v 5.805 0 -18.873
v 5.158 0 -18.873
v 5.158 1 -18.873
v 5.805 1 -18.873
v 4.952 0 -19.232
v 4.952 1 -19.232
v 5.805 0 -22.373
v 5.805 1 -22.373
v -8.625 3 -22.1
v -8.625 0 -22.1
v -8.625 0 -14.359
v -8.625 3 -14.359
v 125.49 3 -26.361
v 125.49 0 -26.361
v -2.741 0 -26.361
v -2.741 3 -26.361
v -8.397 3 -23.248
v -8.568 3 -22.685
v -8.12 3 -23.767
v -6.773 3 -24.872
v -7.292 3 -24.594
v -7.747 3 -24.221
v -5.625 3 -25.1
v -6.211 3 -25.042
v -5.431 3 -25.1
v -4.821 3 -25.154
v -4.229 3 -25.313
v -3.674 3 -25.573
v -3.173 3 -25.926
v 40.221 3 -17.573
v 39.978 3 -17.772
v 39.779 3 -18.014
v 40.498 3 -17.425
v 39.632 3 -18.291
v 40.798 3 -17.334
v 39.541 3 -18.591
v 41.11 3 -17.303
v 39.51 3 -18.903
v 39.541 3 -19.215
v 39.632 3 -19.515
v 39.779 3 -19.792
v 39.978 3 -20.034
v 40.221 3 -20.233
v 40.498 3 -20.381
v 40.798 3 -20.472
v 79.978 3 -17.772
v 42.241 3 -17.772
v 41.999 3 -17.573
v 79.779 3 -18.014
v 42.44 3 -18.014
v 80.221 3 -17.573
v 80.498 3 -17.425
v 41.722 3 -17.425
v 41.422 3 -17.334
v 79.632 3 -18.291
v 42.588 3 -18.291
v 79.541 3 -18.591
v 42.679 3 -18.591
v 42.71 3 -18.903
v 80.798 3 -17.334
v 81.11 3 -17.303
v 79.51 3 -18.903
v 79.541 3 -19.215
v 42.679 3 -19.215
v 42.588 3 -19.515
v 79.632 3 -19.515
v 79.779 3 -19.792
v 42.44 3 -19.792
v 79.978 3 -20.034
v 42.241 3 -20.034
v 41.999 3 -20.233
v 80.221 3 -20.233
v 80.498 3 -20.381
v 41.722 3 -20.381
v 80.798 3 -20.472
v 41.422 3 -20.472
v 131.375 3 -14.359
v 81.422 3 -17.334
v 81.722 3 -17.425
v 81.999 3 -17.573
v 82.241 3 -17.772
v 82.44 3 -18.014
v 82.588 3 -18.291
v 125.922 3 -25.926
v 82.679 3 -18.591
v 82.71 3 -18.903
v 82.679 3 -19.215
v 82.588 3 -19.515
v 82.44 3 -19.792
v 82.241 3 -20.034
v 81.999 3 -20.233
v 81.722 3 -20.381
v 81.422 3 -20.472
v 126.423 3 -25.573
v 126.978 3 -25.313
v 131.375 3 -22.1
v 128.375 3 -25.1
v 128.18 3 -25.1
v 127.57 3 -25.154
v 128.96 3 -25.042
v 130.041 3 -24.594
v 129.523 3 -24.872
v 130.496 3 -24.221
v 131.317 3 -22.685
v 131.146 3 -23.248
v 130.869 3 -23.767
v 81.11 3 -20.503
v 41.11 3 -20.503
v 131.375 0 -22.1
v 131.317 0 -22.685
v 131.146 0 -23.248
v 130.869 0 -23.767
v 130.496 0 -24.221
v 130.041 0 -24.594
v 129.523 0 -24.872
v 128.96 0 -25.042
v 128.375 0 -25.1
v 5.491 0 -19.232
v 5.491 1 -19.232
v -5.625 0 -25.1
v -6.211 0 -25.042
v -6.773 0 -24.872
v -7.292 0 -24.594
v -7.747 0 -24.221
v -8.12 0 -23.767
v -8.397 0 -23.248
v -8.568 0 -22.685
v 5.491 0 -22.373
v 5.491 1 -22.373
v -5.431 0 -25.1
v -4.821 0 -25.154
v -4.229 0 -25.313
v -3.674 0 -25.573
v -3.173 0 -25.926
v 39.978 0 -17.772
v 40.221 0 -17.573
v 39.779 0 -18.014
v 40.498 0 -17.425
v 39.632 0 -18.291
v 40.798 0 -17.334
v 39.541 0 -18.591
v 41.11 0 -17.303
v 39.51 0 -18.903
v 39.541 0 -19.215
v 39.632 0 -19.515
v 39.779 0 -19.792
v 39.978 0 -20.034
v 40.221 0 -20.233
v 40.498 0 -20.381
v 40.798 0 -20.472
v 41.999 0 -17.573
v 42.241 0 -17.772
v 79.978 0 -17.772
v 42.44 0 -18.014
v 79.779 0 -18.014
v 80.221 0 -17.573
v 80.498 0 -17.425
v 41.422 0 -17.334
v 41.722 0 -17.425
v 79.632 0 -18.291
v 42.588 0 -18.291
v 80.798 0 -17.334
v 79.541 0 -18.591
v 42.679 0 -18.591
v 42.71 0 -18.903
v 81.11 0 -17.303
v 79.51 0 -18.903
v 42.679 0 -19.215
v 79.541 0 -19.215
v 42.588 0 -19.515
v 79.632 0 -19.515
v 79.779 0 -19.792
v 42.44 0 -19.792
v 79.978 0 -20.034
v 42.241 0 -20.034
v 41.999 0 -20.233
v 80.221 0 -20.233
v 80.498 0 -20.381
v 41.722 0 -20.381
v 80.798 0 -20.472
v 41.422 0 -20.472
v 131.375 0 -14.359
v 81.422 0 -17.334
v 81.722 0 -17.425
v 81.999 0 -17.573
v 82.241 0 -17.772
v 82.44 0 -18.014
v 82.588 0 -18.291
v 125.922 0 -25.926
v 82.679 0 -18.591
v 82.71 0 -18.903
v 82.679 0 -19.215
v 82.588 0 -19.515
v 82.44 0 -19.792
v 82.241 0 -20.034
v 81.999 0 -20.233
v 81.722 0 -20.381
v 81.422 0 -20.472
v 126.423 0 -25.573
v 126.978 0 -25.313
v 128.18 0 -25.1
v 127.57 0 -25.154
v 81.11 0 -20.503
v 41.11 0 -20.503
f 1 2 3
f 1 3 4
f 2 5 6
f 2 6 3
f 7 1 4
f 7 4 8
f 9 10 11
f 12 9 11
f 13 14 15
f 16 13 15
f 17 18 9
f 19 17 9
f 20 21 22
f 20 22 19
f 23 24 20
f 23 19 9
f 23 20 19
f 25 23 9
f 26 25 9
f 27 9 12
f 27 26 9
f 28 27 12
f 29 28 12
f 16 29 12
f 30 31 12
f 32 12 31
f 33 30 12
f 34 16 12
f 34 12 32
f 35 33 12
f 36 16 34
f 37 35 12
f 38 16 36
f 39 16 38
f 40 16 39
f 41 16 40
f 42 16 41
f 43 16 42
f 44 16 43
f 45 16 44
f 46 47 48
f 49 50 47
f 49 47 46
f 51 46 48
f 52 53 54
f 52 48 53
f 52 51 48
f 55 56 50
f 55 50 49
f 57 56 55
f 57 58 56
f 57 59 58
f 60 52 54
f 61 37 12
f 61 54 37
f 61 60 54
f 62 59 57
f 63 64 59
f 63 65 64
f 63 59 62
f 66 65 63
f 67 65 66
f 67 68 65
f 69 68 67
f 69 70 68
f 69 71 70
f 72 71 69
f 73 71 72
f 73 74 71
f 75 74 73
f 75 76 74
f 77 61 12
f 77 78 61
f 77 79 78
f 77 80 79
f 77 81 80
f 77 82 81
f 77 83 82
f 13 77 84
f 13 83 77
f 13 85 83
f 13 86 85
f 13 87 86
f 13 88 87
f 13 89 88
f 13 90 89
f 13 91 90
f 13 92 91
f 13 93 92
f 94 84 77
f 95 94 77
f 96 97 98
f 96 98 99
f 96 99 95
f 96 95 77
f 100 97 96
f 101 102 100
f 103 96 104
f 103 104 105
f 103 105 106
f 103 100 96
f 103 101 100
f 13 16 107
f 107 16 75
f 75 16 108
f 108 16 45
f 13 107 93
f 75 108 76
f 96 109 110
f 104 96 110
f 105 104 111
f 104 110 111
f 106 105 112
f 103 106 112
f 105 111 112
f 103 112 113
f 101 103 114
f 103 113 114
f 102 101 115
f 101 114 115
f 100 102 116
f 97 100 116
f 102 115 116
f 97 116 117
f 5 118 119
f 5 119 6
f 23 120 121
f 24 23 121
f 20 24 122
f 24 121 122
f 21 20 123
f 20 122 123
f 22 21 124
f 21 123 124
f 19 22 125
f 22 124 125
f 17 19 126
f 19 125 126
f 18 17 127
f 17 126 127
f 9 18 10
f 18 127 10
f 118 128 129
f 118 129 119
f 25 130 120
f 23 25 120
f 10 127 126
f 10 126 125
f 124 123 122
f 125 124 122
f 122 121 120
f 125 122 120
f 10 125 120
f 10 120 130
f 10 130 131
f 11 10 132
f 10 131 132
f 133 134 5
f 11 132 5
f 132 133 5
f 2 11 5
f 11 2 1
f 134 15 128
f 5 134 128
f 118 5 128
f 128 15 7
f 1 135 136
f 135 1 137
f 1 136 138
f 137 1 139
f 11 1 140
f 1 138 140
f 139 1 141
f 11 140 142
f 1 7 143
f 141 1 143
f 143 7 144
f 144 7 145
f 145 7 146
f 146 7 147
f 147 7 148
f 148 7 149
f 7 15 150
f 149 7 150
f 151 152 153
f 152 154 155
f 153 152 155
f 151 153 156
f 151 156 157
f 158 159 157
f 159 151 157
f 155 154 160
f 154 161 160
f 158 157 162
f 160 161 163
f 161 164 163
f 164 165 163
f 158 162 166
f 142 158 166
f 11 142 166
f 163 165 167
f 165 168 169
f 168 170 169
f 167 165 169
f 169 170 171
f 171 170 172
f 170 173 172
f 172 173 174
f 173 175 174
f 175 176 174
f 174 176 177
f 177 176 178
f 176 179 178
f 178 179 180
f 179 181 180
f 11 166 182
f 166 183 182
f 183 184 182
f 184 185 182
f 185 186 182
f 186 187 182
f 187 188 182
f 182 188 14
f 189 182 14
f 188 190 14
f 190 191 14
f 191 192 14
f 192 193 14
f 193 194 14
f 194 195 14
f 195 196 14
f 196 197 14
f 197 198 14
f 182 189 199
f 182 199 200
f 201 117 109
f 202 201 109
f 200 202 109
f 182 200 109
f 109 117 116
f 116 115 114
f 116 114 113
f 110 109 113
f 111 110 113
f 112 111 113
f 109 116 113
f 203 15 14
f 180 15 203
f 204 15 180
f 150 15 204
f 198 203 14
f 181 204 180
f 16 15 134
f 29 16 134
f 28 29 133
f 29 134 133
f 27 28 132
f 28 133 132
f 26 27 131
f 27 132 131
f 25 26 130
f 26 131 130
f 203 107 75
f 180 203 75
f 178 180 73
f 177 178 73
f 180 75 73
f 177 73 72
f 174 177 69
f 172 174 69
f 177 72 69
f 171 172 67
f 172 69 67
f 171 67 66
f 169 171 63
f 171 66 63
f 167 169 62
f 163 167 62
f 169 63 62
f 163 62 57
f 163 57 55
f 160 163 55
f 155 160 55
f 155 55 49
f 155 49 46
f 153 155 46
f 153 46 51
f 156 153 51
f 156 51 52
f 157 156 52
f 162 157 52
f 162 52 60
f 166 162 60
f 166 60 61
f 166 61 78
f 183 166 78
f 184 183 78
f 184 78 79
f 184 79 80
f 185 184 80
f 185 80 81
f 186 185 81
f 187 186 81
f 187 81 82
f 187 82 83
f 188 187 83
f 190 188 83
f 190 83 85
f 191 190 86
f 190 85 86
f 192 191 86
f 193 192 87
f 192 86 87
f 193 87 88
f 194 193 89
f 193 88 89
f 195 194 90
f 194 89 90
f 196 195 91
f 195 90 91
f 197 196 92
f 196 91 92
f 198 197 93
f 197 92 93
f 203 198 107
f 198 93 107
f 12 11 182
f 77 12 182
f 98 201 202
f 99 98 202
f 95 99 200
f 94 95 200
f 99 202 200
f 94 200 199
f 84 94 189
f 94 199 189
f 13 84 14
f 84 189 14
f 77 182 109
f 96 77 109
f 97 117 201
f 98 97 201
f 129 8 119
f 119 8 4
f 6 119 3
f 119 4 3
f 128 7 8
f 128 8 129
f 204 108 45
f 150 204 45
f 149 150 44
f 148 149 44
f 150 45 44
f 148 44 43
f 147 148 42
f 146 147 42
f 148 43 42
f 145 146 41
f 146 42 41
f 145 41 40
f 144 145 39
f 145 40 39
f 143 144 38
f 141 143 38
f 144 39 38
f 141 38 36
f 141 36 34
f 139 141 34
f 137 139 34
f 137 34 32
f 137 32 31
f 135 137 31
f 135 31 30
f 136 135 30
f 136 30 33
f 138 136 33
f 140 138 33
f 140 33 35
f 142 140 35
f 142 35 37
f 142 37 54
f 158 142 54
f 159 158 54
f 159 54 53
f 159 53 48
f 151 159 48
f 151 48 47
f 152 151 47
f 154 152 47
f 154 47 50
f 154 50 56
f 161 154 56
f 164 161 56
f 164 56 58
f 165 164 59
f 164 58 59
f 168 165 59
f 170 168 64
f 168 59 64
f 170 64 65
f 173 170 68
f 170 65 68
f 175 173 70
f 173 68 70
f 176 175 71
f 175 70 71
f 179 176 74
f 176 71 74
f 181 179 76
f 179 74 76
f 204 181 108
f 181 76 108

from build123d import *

# Parameters (mm, degrees)
BOSS_EXTRUDE1_DEPTH = 3
CUT_EXTRUDE1_DEPTH  = 1
CUT_EXTRUDE2_REACH  = 136.027


with BuildPart() as part:
    # Sketch1 → Boss-Extrude1 (new body)
    with BuildSketch(Plane(origin=(0, 0, 0), x_dir=(1, 0, 0), z_dir=(0, 1, 0))):
        with BuildLine():
            Line((-5.431022837, 25.099874039), (-5.62533215, 25.099874039))
            ThreePointArc((-5.62533215, 25.099874039), (-7.746652493, 24.221194382), (-8.62533215, 22.099874039))
            Line((-8.62533215, 22.099874039), (-8.62533215, 14.358894177))
            Line((-8.62533215, 14.358894177), (131.37466785, 14.358894177))
            Line((131.37466785, 14.358894177), (131.37466785, 22.099874039))
            ThreePointArc((131.37466785, 22.099874039), (130.495988194, 24.221194382), (128.37466785, 25.099874039))
            Line((128.37466785, 25.099874039), (128.180358538, 25.099874039))
            ThreePointArc((128.180358538, 25.099874039), (126.694892152, 25.430743303), (125.49028015, 26.360794257))
            Line((125.49028015, 26.360794257), (-2.74094445, 26.360794257))
            ThreePointArc((-2.74094445, 26.360794257), (-3.945556452, 25.430743303), (-5.431022837, 25.099874039))
        make_face()
    extrude(amount=BOSS_EXTRUDE1_DEPTH)

    # Sketch2 → Cut-Extrude1 (cut)
    with BuildSketch(Plane.XZ):
        Polygon((5.157574014, -18.873414802), (5.80470943, -18.873414802), (5.80470943, -22.373414802), (5.490606866, -22.373414802), (5.490606866, -19.232389161), (4.952145328, -19.232389161), align=None)
    extrude(amount=-CUT_EXTRUDE1_DEPTH, mode=Mode.SUBTRACT)

    # Sketch3 → Cut-Extrude2 (cut, up to next)
    with BuildSketch(Plane(origin=(0, 3, 0), x_dir=(1, 0, 0), z_dir=(0, 1, 0)), mode=Mode.PRIVATE) as cut_extrude2_sk1:
        with BuildLine():
            ThreePointArc((41.109797099, 17.303114067), (42.709797099, 18.903114067), (41.109797099, 20.503114067))
            ThreePointArc((41.109797099, 20.503114067), (39.509797099, 18.903114067), (41.109797099, 17.303114067))
        make_face()
    cut_extrude2_tool1 = extrude(cut_extrude2_sk1.sketch, amount=-CUT_EXTRUDE2_REACH, mode=Mode.PRIVATE) & part.part
    # Sketch3 → Cut-Extrude2 (cut, up to next)
    with BuildSketch(Plane(origin=(0, 3, 0), x_dir=(1, 0, 0), z_dir=(0, 1, 0)), mode=Mode.PRIVATE) as cut_extrude2_sk2:
        with BuildLine():
            ThreePointArc((81.109797099, 17.303114067), (82.709797099, 18.903114067), (81.109797099, 20.503114067))
            ThreePointArc((81.109797099, 20.503114067), (79.509797099, 18.903114067), (81.109797099, 17.303114067))
        make_face()
    cut_extrude2_tool2 = extrude(cut_extrude2_sk2.sketch, amount=-CUT_EXTRUDE2_REACH, mode=Mode.PRIVATE) & part.part
    add(cut_extrude2_tool1.solids().sort_by_distance((41.109797, 3, -18.903114))[0], mode=Mode.SUBTRACT)
    add(cut_extrude2_tool2.solids().sort_by_distance((81.109797, 3, -18.903114))[0], mode=Mode.SUBTRACT)


solid = part.part
